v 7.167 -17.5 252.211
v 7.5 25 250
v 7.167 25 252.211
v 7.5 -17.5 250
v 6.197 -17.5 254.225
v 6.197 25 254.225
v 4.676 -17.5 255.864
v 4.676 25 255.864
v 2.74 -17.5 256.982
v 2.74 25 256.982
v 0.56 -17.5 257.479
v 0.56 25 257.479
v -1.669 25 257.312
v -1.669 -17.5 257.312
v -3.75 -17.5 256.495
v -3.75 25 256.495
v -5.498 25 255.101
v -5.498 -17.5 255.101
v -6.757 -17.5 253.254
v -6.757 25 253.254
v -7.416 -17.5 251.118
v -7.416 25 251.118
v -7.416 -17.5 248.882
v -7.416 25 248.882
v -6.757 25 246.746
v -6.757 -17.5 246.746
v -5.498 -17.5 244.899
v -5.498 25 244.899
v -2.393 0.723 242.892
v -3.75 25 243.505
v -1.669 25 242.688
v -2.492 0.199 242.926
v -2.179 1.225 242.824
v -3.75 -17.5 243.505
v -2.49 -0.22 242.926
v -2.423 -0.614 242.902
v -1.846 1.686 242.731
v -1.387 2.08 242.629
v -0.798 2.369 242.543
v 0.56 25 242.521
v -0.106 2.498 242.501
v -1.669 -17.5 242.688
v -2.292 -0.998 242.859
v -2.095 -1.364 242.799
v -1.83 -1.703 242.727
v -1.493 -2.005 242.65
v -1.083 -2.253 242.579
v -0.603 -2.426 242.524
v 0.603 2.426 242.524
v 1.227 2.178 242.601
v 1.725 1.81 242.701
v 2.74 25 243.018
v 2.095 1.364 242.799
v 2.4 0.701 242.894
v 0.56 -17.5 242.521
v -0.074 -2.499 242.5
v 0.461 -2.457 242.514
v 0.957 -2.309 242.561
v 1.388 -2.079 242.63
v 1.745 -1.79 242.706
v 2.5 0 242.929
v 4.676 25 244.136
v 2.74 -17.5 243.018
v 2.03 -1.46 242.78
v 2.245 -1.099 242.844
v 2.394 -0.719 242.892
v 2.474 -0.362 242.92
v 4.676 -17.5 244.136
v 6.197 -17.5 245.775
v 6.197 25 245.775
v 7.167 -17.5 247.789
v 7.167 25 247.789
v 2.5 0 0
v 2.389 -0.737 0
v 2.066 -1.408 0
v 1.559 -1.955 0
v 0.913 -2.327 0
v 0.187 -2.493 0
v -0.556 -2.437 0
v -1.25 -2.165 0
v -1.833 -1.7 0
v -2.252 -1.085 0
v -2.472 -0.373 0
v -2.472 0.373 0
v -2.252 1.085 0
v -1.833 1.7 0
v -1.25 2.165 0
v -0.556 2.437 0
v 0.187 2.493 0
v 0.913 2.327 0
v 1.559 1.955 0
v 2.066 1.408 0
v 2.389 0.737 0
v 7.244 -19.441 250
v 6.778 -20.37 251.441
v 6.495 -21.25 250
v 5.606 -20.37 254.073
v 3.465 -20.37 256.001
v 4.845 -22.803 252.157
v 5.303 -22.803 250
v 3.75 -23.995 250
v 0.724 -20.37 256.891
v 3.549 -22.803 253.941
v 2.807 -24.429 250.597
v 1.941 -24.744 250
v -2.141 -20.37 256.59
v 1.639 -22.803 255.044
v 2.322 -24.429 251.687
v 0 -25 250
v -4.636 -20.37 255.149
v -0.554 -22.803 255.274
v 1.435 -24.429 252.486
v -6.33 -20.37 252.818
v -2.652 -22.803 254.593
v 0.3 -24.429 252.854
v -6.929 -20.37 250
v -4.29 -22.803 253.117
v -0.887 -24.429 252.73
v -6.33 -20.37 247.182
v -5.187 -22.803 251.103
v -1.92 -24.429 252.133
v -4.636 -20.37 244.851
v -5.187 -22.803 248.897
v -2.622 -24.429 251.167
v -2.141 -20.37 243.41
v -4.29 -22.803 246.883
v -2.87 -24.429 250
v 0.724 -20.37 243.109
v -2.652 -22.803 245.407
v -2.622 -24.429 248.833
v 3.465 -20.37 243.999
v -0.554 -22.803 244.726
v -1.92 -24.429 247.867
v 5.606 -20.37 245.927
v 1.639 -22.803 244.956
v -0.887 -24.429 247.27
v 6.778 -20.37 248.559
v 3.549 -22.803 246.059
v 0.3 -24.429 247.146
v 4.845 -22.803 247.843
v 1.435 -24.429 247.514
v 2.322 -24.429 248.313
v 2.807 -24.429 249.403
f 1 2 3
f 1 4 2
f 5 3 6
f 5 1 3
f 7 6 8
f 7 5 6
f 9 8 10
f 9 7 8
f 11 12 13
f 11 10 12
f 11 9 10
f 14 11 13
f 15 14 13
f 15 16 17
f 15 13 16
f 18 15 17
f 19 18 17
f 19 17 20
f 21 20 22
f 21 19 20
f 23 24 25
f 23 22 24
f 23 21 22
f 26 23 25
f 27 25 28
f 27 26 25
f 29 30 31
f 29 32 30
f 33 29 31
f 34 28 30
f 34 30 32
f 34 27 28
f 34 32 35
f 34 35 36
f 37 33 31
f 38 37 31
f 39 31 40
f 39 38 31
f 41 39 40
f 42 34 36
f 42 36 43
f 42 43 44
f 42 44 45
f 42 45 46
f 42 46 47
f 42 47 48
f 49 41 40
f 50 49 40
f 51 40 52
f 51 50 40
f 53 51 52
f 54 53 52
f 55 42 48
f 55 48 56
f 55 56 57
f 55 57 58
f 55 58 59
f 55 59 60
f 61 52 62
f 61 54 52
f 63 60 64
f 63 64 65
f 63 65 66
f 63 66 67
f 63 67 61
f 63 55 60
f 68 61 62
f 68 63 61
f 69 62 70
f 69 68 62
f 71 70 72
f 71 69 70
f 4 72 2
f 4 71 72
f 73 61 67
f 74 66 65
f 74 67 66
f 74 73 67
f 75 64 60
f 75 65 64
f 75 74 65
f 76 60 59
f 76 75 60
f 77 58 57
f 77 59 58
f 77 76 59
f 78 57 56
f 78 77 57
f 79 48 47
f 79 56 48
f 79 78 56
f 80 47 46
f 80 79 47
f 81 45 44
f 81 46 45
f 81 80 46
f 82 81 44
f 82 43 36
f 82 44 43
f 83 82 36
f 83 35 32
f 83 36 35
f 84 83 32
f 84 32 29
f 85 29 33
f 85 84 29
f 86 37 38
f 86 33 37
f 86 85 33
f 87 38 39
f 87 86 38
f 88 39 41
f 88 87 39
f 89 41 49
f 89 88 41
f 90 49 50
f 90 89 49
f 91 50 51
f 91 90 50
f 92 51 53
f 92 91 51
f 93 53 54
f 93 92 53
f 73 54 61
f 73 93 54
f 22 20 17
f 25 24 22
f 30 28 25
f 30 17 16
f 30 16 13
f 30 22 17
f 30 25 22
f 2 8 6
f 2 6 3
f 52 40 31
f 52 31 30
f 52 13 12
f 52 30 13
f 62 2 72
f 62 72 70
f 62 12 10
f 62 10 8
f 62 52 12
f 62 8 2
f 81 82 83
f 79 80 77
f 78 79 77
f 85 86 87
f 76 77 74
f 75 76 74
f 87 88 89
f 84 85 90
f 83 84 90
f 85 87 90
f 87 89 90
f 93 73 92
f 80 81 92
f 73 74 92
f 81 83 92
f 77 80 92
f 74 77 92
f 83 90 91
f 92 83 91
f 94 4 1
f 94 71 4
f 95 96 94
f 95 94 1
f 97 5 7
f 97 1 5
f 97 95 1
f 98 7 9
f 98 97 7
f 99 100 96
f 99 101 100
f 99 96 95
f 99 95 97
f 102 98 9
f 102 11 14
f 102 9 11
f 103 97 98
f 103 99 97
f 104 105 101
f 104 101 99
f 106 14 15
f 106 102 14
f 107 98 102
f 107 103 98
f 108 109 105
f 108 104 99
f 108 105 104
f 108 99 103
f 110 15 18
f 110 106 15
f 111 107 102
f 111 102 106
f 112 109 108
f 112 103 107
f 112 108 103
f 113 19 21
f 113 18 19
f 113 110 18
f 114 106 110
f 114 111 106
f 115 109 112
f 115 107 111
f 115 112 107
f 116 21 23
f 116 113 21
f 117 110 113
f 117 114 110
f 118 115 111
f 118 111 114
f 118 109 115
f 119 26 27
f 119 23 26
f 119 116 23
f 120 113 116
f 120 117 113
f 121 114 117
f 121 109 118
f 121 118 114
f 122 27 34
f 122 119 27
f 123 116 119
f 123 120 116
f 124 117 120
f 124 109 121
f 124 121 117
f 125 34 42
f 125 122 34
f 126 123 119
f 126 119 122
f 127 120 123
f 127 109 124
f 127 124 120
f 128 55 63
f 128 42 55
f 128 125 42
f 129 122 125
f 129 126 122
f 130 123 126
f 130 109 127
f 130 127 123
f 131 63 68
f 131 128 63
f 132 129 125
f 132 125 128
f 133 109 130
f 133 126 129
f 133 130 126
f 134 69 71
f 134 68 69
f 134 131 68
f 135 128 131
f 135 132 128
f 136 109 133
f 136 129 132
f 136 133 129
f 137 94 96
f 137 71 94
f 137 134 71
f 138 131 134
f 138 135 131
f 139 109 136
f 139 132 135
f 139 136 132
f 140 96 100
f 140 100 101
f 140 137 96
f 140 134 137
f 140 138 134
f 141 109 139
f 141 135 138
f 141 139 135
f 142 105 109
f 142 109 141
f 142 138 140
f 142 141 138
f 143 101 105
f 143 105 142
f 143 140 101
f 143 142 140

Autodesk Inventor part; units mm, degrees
ref_plane "YZ Plane" through (0, 0, 0) normal (1, 0, 0) x (0, 1, 0)
ref_plane "XZ Plane" through (0, 0, 0) normal (0, 1, 0) x (-1, 0, 0)
ref_plane "XY Plane" through (0, 0, 0) normal (0, 0, 1) x (1, 0, 0)
sketch "Sketch1" plane through (0, 0, 0) normal (0, 0, 1) x (1, 0, 0)
  circle A0 centre (0, 0) radius 2.5
  dimension "d0" = 5
extrude "Extrusion1" add sketch "Sketch1" along normal blind 250
sketch "Sketch2" plane through (0, 0, 250) normal (0, 0, 1) x (1, 0, 0)
  circle A0 centre (0, 0) radius 2.5 projected
  line L0 (0, 0) -> (0, -25)
  line L1 (0, 0) -> (0, 25)
  line L2 (0, 25) -> (7.5, 25)
  line L3 (7.5, 25) -> (7.5, -25)
  line L4 (7.5, -25) -> (0, -25)
  point P0 (0, 0)
  dimension "d12" = 25
  dimension "d14" = 25
  dimension "d15" = 7.5
revolve "Revolution1" add sketch "Sketch2" angle 360 about axis through (0, 0, 250) along (0, 1, 0) picked at (1.6458, -0.1854) contours A0 L0 L1 | A0 L1 L2 L3 L4 L0
fillet "Fillet4" radius 7.5 1 edges at (-7.5, -25, 250)
properties part number "Threaded hammer"
